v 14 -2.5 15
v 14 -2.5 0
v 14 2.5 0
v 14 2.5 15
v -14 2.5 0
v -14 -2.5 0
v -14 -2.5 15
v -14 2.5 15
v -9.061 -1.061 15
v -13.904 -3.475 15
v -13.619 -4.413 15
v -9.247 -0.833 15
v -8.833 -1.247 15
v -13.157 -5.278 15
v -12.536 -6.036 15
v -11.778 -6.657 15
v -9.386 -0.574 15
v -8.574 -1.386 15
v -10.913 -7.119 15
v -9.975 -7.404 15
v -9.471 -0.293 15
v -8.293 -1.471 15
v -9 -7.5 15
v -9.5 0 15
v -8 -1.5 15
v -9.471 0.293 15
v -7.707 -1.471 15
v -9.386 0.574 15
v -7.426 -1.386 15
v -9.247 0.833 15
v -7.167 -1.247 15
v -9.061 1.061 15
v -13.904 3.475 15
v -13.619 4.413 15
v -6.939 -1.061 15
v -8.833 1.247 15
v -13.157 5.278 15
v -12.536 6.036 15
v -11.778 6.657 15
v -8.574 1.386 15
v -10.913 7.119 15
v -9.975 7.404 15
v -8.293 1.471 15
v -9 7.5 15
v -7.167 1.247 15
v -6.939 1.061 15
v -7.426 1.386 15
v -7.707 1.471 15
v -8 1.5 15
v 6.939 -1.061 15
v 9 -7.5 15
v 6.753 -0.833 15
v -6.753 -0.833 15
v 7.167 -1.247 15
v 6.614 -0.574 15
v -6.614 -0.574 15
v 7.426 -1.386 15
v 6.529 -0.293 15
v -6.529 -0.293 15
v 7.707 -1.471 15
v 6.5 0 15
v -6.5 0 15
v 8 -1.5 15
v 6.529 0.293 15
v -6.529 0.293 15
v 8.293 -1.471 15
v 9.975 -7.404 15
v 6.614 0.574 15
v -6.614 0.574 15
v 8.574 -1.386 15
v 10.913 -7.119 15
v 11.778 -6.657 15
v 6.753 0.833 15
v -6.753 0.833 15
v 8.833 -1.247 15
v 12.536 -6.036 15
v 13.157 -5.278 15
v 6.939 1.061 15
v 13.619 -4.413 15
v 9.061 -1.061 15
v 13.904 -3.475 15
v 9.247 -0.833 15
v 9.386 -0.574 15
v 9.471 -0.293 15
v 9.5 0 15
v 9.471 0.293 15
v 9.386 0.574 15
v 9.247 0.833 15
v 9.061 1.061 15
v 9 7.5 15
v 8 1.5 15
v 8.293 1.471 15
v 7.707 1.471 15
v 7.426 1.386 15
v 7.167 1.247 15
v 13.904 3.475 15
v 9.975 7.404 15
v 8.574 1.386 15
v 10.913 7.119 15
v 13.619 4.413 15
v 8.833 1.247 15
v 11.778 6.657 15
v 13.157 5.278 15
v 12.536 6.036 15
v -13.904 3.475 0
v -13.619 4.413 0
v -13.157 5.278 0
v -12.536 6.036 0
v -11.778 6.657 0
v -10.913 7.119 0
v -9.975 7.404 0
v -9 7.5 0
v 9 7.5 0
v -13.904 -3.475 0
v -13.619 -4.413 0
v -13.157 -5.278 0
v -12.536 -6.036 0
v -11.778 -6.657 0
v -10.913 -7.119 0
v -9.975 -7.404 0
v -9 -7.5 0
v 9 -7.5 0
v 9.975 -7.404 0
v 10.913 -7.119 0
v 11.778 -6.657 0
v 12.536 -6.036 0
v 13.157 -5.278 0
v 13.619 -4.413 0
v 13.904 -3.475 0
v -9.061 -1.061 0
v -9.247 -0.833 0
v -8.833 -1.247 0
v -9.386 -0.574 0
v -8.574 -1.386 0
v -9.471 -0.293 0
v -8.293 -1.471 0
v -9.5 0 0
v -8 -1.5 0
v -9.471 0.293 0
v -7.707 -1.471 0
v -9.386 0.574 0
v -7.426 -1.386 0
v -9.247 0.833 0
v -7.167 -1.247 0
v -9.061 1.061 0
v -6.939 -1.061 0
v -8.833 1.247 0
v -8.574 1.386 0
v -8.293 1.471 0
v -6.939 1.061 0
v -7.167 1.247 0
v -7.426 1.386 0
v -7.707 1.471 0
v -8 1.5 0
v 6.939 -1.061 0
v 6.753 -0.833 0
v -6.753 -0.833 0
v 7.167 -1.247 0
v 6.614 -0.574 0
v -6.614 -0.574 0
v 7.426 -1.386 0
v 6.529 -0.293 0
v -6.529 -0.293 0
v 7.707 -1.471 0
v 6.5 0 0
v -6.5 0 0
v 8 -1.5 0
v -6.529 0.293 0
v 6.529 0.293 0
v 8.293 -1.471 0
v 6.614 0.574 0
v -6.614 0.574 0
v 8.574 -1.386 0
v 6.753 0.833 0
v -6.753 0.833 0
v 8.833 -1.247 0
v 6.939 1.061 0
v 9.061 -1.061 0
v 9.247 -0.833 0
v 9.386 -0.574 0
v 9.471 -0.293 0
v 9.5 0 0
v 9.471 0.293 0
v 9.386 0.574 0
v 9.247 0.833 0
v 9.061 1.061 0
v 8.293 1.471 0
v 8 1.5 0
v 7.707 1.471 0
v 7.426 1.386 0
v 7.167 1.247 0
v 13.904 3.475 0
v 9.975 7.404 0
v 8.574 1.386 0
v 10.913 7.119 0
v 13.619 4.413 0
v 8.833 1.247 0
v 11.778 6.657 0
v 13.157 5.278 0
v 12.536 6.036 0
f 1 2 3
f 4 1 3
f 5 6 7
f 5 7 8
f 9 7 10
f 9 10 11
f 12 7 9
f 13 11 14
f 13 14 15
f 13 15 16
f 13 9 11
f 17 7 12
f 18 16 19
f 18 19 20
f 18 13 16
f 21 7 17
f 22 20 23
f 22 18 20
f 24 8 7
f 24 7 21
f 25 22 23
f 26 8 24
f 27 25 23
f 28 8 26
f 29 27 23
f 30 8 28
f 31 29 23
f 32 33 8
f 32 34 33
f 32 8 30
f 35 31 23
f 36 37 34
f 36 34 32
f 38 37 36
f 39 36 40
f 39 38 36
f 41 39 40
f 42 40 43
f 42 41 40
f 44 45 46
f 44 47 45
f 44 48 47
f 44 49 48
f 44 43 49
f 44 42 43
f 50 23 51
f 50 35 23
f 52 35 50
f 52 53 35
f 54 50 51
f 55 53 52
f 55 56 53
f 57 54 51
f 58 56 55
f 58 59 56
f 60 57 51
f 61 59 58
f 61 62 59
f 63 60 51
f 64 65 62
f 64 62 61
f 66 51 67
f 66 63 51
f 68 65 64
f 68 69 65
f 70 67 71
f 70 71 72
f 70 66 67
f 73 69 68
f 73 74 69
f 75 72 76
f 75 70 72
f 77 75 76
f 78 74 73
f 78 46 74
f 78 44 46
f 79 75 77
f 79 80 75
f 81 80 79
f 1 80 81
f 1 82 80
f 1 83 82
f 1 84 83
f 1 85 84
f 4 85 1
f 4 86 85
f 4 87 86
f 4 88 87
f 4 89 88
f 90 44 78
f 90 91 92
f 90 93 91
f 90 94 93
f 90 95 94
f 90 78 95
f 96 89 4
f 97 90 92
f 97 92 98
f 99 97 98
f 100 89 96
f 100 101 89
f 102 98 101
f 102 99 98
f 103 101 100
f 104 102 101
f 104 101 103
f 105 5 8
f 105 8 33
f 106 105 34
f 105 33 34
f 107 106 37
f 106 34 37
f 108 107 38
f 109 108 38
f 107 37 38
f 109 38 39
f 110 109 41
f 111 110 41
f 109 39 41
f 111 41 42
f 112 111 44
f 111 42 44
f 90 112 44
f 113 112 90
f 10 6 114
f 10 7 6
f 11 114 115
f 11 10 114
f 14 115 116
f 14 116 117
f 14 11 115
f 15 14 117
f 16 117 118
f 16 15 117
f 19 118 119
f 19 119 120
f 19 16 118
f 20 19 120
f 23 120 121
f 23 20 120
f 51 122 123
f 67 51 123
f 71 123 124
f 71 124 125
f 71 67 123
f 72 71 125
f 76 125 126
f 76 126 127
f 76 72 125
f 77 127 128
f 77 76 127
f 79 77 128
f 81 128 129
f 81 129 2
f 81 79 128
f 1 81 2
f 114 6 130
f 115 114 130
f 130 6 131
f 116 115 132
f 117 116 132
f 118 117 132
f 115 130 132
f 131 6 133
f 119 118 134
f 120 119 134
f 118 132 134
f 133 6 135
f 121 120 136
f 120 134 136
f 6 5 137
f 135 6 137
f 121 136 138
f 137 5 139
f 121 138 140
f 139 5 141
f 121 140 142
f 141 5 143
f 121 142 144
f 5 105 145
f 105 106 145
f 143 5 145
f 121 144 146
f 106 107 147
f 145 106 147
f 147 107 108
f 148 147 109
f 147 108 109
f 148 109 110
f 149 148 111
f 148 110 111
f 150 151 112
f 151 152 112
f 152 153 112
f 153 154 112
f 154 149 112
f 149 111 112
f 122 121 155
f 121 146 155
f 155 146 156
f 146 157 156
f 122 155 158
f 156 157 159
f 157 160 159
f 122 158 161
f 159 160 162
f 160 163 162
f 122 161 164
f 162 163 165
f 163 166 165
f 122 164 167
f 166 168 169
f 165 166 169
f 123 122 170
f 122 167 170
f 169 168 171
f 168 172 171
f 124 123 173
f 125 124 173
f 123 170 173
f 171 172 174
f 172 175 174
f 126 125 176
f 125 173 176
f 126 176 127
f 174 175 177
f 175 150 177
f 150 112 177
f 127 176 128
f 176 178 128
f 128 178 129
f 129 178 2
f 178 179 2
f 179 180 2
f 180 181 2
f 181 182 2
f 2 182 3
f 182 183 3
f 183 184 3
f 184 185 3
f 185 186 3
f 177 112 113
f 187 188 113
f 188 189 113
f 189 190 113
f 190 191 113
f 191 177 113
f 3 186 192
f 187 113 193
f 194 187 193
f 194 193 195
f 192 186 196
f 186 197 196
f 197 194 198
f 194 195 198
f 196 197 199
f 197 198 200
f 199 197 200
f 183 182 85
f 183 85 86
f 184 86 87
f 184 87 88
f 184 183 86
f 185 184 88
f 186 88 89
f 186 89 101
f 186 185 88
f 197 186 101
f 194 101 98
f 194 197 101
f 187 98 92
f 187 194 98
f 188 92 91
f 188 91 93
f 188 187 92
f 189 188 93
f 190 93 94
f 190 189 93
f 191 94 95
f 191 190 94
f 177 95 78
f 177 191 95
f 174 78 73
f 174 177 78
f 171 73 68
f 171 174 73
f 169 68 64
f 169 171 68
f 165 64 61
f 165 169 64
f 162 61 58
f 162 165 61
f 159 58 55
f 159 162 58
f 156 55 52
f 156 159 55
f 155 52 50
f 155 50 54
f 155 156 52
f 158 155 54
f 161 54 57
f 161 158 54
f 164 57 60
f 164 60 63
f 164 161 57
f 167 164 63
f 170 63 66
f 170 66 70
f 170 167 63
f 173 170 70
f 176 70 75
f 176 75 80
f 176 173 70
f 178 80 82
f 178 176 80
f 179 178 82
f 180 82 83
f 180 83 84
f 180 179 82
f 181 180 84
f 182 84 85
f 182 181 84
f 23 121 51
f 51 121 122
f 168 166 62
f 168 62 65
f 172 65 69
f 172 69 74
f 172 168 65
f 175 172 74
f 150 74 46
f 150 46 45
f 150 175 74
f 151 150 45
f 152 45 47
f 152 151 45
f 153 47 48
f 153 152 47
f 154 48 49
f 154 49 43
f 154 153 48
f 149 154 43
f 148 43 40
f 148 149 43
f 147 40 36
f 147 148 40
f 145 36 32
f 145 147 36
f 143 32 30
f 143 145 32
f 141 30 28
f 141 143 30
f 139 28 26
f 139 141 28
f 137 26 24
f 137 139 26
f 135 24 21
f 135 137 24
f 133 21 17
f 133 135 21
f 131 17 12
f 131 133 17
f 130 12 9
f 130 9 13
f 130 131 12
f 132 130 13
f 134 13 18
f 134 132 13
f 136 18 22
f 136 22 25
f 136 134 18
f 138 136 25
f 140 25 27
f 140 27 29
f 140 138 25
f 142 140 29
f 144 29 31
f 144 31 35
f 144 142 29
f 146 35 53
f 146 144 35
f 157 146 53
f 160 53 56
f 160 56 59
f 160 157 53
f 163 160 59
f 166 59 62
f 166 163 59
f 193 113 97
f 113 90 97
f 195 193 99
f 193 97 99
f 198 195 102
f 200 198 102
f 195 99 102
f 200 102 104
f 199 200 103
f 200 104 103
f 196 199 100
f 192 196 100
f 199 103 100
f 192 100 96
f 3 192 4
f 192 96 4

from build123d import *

# Parameters (mm, degrees)
ESBO_O1_W                = 28
ESBO_O1_H                = 15
ESBO_O1_R                = 1.5
RESSALTO_EXTRUS_O1_DEPTH = 15
FILETE1_R                = 5


with BuildPart() as part:
    # Esboço1 → Ressalto-extrusão1 (new body)
    with BuildSketch(Plane.XY):
        Rectangle(ESBO_O1_W, ESBO_O1_H)
        with Locations((-8, 0)):
            Circle(ESBO_O1_R, mode=Mode.SUBTRACT)
        with Locations((8, 0)):
            Circle(ESBO_O1_R, mode=Mode.SUBTRACT)
    extrude(amount=RESSALTO_EXTRUS_O1_DEPTH)

    # Filete1
    filete1_edges = [part.edges().sort_by_distance(p)[0] for p in [
        (14, -7.5, 7.5),
        (-14, -7.5, 7.5),
        (-14, 7.5, 7.5),
        (14, 7.5, 7.5),
    ]]
    fillet(filete1_edges, radius=FILETE1_R)


solid = part.part
